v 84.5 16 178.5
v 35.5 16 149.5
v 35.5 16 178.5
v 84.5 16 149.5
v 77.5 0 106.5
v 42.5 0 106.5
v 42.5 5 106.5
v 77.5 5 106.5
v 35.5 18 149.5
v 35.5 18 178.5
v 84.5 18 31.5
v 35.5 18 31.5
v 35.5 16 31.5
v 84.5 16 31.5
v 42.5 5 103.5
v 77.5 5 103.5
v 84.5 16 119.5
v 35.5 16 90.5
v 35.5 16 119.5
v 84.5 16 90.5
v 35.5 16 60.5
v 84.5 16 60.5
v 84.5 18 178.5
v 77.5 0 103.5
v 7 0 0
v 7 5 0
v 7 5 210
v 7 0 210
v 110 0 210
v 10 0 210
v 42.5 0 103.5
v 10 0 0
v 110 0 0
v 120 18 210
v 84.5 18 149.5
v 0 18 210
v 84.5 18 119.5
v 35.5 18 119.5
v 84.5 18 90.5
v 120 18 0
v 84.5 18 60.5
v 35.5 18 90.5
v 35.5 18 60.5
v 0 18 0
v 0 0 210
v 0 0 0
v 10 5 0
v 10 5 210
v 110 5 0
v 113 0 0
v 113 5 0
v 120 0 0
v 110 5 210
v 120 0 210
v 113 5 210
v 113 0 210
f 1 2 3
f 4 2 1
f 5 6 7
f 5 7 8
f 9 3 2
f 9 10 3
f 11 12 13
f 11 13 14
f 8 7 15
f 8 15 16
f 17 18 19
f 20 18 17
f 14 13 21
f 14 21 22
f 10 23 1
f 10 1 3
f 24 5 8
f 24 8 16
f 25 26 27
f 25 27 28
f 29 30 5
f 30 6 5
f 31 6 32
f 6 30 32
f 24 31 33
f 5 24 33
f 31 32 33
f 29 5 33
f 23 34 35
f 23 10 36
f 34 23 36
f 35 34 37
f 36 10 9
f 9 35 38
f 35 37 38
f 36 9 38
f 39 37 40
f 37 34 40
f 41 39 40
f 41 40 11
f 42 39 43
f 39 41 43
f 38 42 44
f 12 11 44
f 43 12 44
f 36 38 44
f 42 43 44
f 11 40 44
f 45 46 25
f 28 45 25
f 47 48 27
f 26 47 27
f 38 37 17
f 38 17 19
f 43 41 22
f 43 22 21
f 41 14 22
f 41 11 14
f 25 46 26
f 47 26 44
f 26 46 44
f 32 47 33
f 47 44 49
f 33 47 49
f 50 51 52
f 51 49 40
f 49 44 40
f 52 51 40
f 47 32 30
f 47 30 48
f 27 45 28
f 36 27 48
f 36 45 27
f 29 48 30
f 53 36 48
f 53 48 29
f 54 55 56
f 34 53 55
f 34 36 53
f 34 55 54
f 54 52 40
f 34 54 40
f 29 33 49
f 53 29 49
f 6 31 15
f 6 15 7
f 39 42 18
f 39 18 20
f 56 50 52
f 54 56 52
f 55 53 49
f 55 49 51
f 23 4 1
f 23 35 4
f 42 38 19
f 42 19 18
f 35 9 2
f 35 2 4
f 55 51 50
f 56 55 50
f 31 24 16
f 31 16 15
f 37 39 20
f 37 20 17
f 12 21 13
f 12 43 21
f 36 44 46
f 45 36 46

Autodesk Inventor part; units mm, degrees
ref_plane "YZ Plane" through (0, 0, 0) normal (1, 0, 0) x (0, 1, 0)
ref_plane "XZ Plane" through (0, 0, 0) normal (0, 1, 0) x (-1, 0, 0)
ref_plane "XY Plane" through (0, 0, 0) normal (0, 0, 1) x (1, 0, 0)
sketch "Sketch1" plane through (0, 0, 0) normal (0, 0, 1) x (1, 0, 0)
  line L0 (0, 0) -> (120, 0)
  line L1 (120, 0) -> (120, 18)
  line L2 (120, 18) -> (0, 18)
  line L3 (0, 18) -> (0, 0)
  dimension "d0" = 18
  dimension "d1" = 120
extrude "Extrusion1" add sketch "Sketch1" along normal blind 210
sketch "Sketch2" plane through (0, 0, 210) normal (0, 0, 1) x (1, 0, 0)
  line L0 (0, 0) -> (120, 0) projected
  line L1 (7, 0) -> (10, 0)
  line L2 (10, 0) -> (10, 5)
  line L3 (10, 5) -> (7, 5)
  line L4 (7, 5) -> (7, 0)
  line L5 (60, 0) -> (60, -17.5294) construction
  line L6 (113, 0) -> (110, 0)
  line L7 (110, 0) -> (110, 5)
  line L8 (110, 5) -> (113, 5)
  line L9 (113, 5) -> (113, 0)
  point P0 (110, 0)
  point P1 (113, 0)
  dimension "d4" = 3
  dimension "d5" = 5
  dimension "d26" = 100
extrude "Extrusion2" cut sketch "Sketch2" against normal through all
sketch "Sketch3" plane through (0, 18, 0) normal (0, 1, 0) x (1, 0, 0)
  line L0 (35.5, -31.5) -> (84.5, -31.5)
  line L1 (84.5, -31.5) -> (84.5, -60.5)
  line L2 (84.5, -60.5) -> (35.5, -60.5)
  line L3 (35.5, -60.5) -> (35.5, -31.5)
  line L4 (35.5, -90.5) -> (84.5, -90.5)
  line L5 (84.5, -90.5) -> (84.5, -119.5)
  line L6 (84.5, -119.5) -> (35.5, -119.5)
  line L7 (35.5, -119.5) -> (35.5, -90.5)
  line L8 (35.5, -149.5) -> (84.5, -149.5)
  line L9 (84.5, -149.5) -> (84.5, -178.5)
  line L10 (84.5, -178.5) -> (35.5, -178.5)
  line L11 (35.5, -178.5) -> (35.5, -149.5)
  line L12 (0, 0) -> (0, -210) projected
  line L13 (120, 0) -> (0, 0) projected
  point P0 (0, -105)
  point P1 (35.5, -105)
  point P2 (60, 0)
  point P3 (60, -31.5)
  dimension "d9" = 29
  dimension "d10" = 49
  dimension "d13" = 59
extrude "Extrusion3" cut sketch "Sketch3" against normal blind 2
sketch "Sketch4" plane through (10, 0, 0) normal (0, -1, 0) x (1, 0, 0)
  line L0 (-10, 0) -> (-10, 210) projected
  line L1 (0, 0) -> (100, 0) projected
  line L2 (32.5, 106.5) -> (67.5, 106.5)
  line L3 (67.5, 106.5) -> (67.5, 103.5)
  line L4 (67.5, 103.5) -> (32.5, 103.5)
  line L5 (32.5, 103.5) -> (32.5, 106.5)
  point P0 (-10, 105)
  point P1 (32.5, 105)
  point P2 (50, 103.5)
  point P3 (50, 0)
  dimension "d20" = 3
  dimension "d21" = 35
extrude "Extrusion4" cut sketch "Sketch4" against normal blind 5
properties part number "topplatform"
